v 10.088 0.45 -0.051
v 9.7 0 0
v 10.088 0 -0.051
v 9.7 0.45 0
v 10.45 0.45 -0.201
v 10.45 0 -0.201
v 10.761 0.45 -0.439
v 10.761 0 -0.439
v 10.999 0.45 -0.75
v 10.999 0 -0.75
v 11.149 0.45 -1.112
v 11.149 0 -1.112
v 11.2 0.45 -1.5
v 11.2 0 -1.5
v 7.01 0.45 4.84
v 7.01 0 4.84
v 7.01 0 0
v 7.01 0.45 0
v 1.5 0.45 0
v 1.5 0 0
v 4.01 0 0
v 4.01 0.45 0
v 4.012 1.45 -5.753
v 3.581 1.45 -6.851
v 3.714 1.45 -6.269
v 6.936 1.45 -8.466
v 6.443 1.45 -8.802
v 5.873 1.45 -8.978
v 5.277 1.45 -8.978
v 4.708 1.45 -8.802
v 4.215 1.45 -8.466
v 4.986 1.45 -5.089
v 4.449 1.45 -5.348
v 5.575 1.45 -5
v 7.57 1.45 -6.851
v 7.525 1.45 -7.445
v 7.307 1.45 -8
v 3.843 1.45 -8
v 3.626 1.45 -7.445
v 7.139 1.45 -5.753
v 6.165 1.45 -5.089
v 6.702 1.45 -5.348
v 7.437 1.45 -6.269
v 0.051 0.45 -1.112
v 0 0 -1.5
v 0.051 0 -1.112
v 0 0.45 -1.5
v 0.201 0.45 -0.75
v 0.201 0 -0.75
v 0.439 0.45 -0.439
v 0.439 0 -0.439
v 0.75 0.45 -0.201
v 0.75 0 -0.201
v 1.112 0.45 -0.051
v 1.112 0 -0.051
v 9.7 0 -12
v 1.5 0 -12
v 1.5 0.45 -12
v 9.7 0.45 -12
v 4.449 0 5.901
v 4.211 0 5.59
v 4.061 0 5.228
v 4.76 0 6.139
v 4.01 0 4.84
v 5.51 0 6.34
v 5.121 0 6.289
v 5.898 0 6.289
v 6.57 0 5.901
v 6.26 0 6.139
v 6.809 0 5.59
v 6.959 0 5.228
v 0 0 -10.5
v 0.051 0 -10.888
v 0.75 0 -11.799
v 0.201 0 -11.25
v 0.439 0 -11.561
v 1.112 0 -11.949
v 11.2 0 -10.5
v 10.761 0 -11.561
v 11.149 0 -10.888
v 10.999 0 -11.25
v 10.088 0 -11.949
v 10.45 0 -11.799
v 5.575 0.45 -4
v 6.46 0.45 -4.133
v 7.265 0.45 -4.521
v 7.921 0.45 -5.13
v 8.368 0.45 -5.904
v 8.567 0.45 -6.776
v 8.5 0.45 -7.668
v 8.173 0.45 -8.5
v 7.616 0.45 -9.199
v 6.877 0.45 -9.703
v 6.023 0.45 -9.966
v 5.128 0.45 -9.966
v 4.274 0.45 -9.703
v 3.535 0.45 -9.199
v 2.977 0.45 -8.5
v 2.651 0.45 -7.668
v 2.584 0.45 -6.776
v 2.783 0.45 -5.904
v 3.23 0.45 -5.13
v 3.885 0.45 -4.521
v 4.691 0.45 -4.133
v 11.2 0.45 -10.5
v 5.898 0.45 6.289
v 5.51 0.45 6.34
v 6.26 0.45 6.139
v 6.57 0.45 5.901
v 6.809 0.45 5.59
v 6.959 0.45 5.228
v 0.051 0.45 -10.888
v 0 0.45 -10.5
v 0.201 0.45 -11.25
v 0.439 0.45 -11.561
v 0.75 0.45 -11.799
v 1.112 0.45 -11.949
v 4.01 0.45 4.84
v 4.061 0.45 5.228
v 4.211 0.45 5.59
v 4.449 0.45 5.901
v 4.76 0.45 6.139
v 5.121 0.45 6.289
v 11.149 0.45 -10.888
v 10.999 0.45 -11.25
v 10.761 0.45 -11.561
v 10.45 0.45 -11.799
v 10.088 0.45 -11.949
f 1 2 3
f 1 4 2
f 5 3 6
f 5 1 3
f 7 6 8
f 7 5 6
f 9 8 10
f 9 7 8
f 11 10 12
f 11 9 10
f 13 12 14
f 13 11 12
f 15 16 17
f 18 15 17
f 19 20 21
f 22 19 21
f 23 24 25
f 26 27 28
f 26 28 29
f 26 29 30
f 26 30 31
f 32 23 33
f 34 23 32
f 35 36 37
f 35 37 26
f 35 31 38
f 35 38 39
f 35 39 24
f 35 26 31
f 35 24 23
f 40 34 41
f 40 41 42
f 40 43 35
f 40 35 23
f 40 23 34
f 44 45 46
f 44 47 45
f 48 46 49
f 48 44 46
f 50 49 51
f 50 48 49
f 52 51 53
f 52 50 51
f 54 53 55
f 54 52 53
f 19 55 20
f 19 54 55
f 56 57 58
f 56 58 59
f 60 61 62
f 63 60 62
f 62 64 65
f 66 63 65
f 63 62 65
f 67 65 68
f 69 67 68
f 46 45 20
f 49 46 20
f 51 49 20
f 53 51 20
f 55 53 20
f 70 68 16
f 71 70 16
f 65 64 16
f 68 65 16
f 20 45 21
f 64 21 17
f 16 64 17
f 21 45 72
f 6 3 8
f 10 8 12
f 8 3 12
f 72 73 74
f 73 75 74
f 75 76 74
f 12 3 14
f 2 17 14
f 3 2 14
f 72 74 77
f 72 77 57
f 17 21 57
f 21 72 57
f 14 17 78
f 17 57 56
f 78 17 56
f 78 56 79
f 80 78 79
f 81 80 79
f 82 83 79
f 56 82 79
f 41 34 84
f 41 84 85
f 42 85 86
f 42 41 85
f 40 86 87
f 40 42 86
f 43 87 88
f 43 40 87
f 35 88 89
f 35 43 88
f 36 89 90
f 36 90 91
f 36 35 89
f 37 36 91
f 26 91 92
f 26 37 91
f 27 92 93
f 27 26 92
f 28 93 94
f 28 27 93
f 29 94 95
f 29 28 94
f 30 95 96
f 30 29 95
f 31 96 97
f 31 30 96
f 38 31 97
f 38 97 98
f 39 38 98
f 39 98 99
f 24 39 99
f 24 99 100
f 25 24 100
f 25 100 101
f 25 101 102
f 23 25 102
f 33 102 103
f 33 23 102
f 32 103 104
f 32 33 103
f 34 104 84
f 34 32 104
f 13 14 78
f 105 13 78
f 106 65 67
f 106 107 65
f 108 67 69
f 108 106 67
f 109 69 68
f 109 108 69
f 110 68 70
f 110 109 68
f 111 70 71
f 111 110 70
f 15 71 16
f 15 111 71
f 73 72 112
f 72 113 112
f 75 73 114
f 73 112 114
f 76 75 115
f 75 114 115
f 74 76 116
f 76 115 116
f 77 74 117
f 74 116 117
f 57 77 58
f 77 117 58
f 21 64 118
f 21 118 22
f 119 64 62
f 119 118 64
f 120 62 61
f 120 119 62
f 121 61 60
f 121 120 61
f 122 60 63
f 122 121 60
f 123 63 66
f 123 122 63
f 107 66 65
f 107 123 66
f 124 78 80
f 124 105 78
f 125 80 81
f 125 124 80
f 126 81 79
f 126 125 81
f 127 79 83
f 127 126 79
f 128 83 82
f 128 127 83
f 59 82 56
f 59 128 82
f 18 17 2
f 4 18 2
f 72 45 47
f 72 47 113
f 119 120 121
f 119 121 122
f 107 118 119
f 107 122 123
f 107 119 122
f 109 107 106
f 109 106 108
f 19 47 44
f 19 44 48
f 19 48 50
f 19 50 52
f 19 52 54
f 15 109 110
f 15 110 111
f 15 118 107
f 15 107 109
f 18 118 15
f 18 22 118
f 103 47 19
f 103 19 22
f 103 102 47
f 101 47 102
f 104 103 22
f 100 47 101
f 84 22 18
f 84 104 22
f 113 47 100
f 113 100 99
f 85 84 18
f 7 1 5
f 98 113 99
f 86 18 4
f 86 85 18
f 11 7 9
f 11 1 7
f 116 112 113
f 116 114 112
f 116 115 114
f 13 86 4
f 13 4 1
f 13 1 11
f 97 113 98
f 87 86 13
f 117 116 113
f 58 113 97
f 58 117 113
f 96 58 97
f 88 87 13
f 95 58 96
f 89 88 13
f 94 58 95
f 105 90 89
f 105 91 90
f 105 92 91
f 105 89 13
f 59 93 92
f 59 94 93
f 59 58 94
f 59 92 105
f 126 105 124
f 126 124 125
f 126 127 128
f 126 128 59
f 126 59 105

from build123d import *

# Parameters (mm, degrees)
SKETCH1_W           = 11.2
SKETCH1_H           = 12
SKETCH1_W_2         = 3
SKETCH1_H_2         = 6.34
BOSS_EXTRUDE1_DEPTH = 0.45
FILLET1_R           = 1.5
SKETCH2_R           = 2
BOSS_EXTRUDE2_DEPTH = 1
CHAMFER1_SIZE       = 1


with BuildPart() as part:
    # Sketch1 → Boss-Extrude1 (new body)
    with BuildSketch(Plane(origin=(0, 0, 0), x_dir=(1, 0, 0), z_dir=(0, 1, 0))):
        with Locations((5.6, 6)):
            Rectangle(SKETCH1_W, SKETCH1_H)
        with Locations((5.509745164, -3.17)):
            Rectangle(SKETCH1_W_2, SKETCH1_H_2)
    extrude(amount=BOSS_EXTRUDE1_DEPTH)

    # Fillet1
    fillet1_edges = [part.edges().sort_by_distance(p)[0] for p in [
        (0, 0.225, 0),
        (0, 0.225, -12),
        (11.2, 0.225, -12),
        (11.2, 0.225, 0),
        (7.009745164, 0.225, 6.34),
        (4.009745164, 0.225, 6.34),
    ]]
    fillet(fillet1_edges, radius=FILLET1_R - 0.0001)  # a hair under: the kernel refuses the full size

    # Sketch2 → Boss-Extrude2 (add)
    with BuildSketch(Plane(origin=(0, 0.45, 0), x_dir=(1, 0, 0), z_dir=(0, 1, 0))):
        with Locations(Location((5.575393992, 7, 0), (0, 0, 270))):
            Circle(SKETCH2_R)
    extrude(amount=BOSS_EXTRUDE2_DEPTH)

    # Chamfer1
    chamfer1_edges = [part.edges().sort_by_distance(p)[0] for p in [
        (5.575393992, 0.45, -9),
    ]]
    chamfer(chamfer1_edges, length=CHAMFER1_SIZE - 0.0001)  # a hair under: the kernel refuses the full size


solid = part.part
